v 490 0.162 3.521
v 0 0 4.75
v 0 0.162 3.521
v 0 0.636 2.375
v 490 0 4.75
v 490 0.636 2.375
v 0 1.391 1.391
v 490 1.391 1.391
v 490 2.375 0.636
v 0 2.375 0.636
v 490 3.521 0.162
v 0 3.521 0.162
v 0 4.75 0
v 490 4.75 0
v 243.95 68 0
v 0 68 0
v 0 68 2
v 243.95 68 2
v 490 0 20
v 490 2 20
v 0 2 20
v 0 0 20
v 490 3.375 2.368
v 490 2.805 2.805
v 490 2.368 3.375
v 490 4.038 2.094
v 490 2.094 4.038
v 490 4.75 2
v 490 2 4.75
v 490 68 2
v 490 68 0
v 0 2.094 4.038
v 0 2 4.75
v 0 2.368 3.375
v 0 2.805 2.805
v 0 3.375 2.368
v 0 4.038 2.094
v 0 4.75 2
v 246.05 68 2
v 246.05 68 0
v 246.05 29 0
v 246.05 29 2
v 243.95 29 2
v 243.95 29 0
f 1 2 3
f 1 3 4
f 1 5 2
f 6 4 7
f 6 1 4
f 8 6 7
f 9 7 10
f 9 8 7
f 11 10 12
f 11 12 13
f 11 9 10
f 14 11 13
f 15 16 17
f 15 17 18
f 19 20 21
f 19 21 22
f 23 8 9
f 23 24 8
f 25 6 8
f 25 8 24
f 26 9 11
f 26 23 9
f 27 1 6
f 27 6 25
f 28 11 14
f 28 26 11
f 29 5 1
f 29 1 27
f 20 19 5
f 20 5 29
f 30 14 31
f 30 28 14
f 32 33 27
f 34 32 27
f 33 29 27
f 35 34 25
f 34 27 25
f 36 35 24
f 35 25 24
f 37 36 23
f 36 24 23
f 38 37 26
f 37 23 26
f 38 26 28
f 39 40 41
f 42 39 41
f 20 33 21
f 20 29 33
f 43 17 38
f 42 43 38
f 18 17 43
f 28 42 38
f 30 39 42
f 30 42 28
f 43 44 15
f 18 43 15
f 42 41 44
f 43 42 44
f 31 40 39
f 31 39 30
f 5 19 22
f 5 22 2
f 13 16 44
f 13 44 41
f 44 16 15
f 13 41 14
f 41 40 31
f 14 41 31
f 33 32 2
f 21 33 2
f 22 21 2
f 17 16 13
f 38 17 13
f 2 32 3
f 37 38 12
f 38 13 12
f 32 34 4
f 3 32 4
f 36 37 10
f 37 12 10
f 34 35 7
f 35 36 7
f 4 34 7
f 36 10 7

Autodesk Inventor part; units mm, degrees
ref_plane "YZ Plane" through (0, 0, 0) normal (1, 0, 0) x (0, 1, 0)
ref_plane "XZ Plane" through (0, 0, 0) normal (0, 1, 0) x (-1, 0, 0)
ref_plane "XY Plane" through (0, 0, 0) normal (0, 0, 1) x (1, 0, 0)
sketch "Sketch1" plane through (0, 0, 0) normal (0, 0, 1) x (1, 0, 0)
  line L0 (-490, 68) -> (490, 68)
  line L1 (490, 68) -> (490, 0)
  line L2 (490, 0) -> (-490, 0)
  line L3 (-490, 0) -> (-490, 68)
  point P0 (0, 0)
  point P1 (0, 0)
  dimension "d0" = 980
  dimension "d1" = 68
extrude "Plate1" add sketch "Sketch1" along normal blind 2
sketch "Sketch2" plane through (490, 2, 0) normal (0, -1, 0) x (1, 0, 0)
  line L0 (-980, 0) -> (0, 0)
  line L1 (0, 0) -> (0, 20)
  line L2 (0, 20) -> (-980, 20)
  line L3 (-980, 20) -> (-980, 0)
edge flange "Flange1" height 20 angle 90 thickness 2 bend radius 2.75 thickness toward (0, -1, 0) relief round relief width 2 relief depth 1 edges at (0, 0, 2) wall of the first edge with corners at (-490, 2, 0) (490, 2, 0) (490, 2, 20) (-490, 2, 20)
bend "Bend1"
corner "Corner1"
sketch "Sketch5" plane through (0, 0, 0) normal (0, 0, -1) x (-1, 0, 0)
  line L0 (490, 68) -> (-490, 68) projected
  line L1 (490, 0) -> (-490, 0) projected
  circle A0 centre (0, 68) radius 35
  line L2 (243.95, 68) -> (246.05, 68)
  line L3 (246.05, 68) -> (246.05, 29)
  line L4 (246.05, 29) -> (243.95, 29)
  line L5 (243.95, 29) -> (243.95, 68)
  line L6 (-243.95, 68) -> (-246.05, 68)
  line L7 (-246.05, 68) -> (-246.05, 29)
  line L8 (-246.05, 29) -> (-243.95, 29)
  line L9 (-243.95, 29) -> (-243.95, 68)
  line L10 (0, 68) -> (0, 0) construction
  line L11 (0, 68) -> (0, 0)
  line L12 (490, 68) -> (490, 4.75) projected
  line L13 (490, 0) -> (490, 4.75) projected
  line L14 (-490, 4.75) -> (-490, 68) projected
  line L15 (-490, 4.75) -> (-490, 0) projected
  point P0 (0, 0)
  point P1 (245, 29)
  point P2 (-245, 29)
  point P3 (-35, 68)
  point P4 (35, 68)
  dimension "d45" = 70
  dimension "d48" = 2.1
  dimension "d49" = 490
  dimension "d51" = 29
  dimension "d52" = 39
extrude "Extrusion1" cut sketch "Sketch5" against normal through all contours L12 L13 L1 L11 A0 L0 L5 L4 L3 | L3 L4 L5 L0 | A0 L11 L0 | L9 L8 L7 L0 picked at (23.0408, 65.4039)
sketch "Sketch9" plane through (0, 0, 2) normal (0, 0, 1) x (1, 0, 0)
  line L0 (485.6141, 29.596) -> (485.6141, 17.596) construction
  line L1 (485.6141, 17.596) -> (285.6141, 17.596) construction
  line L2 (285.6141, 17.596) -> (285.6141, 29.596) construction
  line L3 (285.6141, 29.596) -> (485.6141, 29.596) construction
  line L4 (-490, 68) -> (490, 68) projected
  point P0 (0, 0)
  point P1 (1.05, 68)
  dimension "d40" = 200
  dimension "d41" = 12
mark "Mark2"
equation "\"d1\" = СПИНА_Стрингер_2_высота"
equation "\"d2\" = Thickness"
equation "\"d3\" = BendReliefWidth"
equation "\"d4\" = BendReliefDepth"
equation "\"d5\" = MinimumRemnant"
equation "\"d6\" = TransitionRadius"
equation "\"d9\" = BendRadius"
equation "\"d10\" = CornerReliefSize"
equation "\"d11\" = GapSize"
equation "\"d12\" = JacobiRadiusSize"
equation "\"BendReliefWidth\" = Thickness"
equation "\"BendReliefDepth\" = 0.5 * Thickness"
equation "\"CornerReliefSize\" = 4 * Thickness"
equation "\"MinimumRemnant\" = 2 * Thickness"
equation "\"TransitionRadius\" = BendRadius"
equation "\"JacobiRadiusSize\" = BendRadius"
equation "\"GapSize\" = Thickness"
equation "\"СПИНА_Стрингер_2_высота\" = 68"
equation "\"Thickness\" = 2"
equation "\"BendRadius\" = 2.75"
properties part number "MSC 207 stringer back ^^" material "Stainless Steel"
